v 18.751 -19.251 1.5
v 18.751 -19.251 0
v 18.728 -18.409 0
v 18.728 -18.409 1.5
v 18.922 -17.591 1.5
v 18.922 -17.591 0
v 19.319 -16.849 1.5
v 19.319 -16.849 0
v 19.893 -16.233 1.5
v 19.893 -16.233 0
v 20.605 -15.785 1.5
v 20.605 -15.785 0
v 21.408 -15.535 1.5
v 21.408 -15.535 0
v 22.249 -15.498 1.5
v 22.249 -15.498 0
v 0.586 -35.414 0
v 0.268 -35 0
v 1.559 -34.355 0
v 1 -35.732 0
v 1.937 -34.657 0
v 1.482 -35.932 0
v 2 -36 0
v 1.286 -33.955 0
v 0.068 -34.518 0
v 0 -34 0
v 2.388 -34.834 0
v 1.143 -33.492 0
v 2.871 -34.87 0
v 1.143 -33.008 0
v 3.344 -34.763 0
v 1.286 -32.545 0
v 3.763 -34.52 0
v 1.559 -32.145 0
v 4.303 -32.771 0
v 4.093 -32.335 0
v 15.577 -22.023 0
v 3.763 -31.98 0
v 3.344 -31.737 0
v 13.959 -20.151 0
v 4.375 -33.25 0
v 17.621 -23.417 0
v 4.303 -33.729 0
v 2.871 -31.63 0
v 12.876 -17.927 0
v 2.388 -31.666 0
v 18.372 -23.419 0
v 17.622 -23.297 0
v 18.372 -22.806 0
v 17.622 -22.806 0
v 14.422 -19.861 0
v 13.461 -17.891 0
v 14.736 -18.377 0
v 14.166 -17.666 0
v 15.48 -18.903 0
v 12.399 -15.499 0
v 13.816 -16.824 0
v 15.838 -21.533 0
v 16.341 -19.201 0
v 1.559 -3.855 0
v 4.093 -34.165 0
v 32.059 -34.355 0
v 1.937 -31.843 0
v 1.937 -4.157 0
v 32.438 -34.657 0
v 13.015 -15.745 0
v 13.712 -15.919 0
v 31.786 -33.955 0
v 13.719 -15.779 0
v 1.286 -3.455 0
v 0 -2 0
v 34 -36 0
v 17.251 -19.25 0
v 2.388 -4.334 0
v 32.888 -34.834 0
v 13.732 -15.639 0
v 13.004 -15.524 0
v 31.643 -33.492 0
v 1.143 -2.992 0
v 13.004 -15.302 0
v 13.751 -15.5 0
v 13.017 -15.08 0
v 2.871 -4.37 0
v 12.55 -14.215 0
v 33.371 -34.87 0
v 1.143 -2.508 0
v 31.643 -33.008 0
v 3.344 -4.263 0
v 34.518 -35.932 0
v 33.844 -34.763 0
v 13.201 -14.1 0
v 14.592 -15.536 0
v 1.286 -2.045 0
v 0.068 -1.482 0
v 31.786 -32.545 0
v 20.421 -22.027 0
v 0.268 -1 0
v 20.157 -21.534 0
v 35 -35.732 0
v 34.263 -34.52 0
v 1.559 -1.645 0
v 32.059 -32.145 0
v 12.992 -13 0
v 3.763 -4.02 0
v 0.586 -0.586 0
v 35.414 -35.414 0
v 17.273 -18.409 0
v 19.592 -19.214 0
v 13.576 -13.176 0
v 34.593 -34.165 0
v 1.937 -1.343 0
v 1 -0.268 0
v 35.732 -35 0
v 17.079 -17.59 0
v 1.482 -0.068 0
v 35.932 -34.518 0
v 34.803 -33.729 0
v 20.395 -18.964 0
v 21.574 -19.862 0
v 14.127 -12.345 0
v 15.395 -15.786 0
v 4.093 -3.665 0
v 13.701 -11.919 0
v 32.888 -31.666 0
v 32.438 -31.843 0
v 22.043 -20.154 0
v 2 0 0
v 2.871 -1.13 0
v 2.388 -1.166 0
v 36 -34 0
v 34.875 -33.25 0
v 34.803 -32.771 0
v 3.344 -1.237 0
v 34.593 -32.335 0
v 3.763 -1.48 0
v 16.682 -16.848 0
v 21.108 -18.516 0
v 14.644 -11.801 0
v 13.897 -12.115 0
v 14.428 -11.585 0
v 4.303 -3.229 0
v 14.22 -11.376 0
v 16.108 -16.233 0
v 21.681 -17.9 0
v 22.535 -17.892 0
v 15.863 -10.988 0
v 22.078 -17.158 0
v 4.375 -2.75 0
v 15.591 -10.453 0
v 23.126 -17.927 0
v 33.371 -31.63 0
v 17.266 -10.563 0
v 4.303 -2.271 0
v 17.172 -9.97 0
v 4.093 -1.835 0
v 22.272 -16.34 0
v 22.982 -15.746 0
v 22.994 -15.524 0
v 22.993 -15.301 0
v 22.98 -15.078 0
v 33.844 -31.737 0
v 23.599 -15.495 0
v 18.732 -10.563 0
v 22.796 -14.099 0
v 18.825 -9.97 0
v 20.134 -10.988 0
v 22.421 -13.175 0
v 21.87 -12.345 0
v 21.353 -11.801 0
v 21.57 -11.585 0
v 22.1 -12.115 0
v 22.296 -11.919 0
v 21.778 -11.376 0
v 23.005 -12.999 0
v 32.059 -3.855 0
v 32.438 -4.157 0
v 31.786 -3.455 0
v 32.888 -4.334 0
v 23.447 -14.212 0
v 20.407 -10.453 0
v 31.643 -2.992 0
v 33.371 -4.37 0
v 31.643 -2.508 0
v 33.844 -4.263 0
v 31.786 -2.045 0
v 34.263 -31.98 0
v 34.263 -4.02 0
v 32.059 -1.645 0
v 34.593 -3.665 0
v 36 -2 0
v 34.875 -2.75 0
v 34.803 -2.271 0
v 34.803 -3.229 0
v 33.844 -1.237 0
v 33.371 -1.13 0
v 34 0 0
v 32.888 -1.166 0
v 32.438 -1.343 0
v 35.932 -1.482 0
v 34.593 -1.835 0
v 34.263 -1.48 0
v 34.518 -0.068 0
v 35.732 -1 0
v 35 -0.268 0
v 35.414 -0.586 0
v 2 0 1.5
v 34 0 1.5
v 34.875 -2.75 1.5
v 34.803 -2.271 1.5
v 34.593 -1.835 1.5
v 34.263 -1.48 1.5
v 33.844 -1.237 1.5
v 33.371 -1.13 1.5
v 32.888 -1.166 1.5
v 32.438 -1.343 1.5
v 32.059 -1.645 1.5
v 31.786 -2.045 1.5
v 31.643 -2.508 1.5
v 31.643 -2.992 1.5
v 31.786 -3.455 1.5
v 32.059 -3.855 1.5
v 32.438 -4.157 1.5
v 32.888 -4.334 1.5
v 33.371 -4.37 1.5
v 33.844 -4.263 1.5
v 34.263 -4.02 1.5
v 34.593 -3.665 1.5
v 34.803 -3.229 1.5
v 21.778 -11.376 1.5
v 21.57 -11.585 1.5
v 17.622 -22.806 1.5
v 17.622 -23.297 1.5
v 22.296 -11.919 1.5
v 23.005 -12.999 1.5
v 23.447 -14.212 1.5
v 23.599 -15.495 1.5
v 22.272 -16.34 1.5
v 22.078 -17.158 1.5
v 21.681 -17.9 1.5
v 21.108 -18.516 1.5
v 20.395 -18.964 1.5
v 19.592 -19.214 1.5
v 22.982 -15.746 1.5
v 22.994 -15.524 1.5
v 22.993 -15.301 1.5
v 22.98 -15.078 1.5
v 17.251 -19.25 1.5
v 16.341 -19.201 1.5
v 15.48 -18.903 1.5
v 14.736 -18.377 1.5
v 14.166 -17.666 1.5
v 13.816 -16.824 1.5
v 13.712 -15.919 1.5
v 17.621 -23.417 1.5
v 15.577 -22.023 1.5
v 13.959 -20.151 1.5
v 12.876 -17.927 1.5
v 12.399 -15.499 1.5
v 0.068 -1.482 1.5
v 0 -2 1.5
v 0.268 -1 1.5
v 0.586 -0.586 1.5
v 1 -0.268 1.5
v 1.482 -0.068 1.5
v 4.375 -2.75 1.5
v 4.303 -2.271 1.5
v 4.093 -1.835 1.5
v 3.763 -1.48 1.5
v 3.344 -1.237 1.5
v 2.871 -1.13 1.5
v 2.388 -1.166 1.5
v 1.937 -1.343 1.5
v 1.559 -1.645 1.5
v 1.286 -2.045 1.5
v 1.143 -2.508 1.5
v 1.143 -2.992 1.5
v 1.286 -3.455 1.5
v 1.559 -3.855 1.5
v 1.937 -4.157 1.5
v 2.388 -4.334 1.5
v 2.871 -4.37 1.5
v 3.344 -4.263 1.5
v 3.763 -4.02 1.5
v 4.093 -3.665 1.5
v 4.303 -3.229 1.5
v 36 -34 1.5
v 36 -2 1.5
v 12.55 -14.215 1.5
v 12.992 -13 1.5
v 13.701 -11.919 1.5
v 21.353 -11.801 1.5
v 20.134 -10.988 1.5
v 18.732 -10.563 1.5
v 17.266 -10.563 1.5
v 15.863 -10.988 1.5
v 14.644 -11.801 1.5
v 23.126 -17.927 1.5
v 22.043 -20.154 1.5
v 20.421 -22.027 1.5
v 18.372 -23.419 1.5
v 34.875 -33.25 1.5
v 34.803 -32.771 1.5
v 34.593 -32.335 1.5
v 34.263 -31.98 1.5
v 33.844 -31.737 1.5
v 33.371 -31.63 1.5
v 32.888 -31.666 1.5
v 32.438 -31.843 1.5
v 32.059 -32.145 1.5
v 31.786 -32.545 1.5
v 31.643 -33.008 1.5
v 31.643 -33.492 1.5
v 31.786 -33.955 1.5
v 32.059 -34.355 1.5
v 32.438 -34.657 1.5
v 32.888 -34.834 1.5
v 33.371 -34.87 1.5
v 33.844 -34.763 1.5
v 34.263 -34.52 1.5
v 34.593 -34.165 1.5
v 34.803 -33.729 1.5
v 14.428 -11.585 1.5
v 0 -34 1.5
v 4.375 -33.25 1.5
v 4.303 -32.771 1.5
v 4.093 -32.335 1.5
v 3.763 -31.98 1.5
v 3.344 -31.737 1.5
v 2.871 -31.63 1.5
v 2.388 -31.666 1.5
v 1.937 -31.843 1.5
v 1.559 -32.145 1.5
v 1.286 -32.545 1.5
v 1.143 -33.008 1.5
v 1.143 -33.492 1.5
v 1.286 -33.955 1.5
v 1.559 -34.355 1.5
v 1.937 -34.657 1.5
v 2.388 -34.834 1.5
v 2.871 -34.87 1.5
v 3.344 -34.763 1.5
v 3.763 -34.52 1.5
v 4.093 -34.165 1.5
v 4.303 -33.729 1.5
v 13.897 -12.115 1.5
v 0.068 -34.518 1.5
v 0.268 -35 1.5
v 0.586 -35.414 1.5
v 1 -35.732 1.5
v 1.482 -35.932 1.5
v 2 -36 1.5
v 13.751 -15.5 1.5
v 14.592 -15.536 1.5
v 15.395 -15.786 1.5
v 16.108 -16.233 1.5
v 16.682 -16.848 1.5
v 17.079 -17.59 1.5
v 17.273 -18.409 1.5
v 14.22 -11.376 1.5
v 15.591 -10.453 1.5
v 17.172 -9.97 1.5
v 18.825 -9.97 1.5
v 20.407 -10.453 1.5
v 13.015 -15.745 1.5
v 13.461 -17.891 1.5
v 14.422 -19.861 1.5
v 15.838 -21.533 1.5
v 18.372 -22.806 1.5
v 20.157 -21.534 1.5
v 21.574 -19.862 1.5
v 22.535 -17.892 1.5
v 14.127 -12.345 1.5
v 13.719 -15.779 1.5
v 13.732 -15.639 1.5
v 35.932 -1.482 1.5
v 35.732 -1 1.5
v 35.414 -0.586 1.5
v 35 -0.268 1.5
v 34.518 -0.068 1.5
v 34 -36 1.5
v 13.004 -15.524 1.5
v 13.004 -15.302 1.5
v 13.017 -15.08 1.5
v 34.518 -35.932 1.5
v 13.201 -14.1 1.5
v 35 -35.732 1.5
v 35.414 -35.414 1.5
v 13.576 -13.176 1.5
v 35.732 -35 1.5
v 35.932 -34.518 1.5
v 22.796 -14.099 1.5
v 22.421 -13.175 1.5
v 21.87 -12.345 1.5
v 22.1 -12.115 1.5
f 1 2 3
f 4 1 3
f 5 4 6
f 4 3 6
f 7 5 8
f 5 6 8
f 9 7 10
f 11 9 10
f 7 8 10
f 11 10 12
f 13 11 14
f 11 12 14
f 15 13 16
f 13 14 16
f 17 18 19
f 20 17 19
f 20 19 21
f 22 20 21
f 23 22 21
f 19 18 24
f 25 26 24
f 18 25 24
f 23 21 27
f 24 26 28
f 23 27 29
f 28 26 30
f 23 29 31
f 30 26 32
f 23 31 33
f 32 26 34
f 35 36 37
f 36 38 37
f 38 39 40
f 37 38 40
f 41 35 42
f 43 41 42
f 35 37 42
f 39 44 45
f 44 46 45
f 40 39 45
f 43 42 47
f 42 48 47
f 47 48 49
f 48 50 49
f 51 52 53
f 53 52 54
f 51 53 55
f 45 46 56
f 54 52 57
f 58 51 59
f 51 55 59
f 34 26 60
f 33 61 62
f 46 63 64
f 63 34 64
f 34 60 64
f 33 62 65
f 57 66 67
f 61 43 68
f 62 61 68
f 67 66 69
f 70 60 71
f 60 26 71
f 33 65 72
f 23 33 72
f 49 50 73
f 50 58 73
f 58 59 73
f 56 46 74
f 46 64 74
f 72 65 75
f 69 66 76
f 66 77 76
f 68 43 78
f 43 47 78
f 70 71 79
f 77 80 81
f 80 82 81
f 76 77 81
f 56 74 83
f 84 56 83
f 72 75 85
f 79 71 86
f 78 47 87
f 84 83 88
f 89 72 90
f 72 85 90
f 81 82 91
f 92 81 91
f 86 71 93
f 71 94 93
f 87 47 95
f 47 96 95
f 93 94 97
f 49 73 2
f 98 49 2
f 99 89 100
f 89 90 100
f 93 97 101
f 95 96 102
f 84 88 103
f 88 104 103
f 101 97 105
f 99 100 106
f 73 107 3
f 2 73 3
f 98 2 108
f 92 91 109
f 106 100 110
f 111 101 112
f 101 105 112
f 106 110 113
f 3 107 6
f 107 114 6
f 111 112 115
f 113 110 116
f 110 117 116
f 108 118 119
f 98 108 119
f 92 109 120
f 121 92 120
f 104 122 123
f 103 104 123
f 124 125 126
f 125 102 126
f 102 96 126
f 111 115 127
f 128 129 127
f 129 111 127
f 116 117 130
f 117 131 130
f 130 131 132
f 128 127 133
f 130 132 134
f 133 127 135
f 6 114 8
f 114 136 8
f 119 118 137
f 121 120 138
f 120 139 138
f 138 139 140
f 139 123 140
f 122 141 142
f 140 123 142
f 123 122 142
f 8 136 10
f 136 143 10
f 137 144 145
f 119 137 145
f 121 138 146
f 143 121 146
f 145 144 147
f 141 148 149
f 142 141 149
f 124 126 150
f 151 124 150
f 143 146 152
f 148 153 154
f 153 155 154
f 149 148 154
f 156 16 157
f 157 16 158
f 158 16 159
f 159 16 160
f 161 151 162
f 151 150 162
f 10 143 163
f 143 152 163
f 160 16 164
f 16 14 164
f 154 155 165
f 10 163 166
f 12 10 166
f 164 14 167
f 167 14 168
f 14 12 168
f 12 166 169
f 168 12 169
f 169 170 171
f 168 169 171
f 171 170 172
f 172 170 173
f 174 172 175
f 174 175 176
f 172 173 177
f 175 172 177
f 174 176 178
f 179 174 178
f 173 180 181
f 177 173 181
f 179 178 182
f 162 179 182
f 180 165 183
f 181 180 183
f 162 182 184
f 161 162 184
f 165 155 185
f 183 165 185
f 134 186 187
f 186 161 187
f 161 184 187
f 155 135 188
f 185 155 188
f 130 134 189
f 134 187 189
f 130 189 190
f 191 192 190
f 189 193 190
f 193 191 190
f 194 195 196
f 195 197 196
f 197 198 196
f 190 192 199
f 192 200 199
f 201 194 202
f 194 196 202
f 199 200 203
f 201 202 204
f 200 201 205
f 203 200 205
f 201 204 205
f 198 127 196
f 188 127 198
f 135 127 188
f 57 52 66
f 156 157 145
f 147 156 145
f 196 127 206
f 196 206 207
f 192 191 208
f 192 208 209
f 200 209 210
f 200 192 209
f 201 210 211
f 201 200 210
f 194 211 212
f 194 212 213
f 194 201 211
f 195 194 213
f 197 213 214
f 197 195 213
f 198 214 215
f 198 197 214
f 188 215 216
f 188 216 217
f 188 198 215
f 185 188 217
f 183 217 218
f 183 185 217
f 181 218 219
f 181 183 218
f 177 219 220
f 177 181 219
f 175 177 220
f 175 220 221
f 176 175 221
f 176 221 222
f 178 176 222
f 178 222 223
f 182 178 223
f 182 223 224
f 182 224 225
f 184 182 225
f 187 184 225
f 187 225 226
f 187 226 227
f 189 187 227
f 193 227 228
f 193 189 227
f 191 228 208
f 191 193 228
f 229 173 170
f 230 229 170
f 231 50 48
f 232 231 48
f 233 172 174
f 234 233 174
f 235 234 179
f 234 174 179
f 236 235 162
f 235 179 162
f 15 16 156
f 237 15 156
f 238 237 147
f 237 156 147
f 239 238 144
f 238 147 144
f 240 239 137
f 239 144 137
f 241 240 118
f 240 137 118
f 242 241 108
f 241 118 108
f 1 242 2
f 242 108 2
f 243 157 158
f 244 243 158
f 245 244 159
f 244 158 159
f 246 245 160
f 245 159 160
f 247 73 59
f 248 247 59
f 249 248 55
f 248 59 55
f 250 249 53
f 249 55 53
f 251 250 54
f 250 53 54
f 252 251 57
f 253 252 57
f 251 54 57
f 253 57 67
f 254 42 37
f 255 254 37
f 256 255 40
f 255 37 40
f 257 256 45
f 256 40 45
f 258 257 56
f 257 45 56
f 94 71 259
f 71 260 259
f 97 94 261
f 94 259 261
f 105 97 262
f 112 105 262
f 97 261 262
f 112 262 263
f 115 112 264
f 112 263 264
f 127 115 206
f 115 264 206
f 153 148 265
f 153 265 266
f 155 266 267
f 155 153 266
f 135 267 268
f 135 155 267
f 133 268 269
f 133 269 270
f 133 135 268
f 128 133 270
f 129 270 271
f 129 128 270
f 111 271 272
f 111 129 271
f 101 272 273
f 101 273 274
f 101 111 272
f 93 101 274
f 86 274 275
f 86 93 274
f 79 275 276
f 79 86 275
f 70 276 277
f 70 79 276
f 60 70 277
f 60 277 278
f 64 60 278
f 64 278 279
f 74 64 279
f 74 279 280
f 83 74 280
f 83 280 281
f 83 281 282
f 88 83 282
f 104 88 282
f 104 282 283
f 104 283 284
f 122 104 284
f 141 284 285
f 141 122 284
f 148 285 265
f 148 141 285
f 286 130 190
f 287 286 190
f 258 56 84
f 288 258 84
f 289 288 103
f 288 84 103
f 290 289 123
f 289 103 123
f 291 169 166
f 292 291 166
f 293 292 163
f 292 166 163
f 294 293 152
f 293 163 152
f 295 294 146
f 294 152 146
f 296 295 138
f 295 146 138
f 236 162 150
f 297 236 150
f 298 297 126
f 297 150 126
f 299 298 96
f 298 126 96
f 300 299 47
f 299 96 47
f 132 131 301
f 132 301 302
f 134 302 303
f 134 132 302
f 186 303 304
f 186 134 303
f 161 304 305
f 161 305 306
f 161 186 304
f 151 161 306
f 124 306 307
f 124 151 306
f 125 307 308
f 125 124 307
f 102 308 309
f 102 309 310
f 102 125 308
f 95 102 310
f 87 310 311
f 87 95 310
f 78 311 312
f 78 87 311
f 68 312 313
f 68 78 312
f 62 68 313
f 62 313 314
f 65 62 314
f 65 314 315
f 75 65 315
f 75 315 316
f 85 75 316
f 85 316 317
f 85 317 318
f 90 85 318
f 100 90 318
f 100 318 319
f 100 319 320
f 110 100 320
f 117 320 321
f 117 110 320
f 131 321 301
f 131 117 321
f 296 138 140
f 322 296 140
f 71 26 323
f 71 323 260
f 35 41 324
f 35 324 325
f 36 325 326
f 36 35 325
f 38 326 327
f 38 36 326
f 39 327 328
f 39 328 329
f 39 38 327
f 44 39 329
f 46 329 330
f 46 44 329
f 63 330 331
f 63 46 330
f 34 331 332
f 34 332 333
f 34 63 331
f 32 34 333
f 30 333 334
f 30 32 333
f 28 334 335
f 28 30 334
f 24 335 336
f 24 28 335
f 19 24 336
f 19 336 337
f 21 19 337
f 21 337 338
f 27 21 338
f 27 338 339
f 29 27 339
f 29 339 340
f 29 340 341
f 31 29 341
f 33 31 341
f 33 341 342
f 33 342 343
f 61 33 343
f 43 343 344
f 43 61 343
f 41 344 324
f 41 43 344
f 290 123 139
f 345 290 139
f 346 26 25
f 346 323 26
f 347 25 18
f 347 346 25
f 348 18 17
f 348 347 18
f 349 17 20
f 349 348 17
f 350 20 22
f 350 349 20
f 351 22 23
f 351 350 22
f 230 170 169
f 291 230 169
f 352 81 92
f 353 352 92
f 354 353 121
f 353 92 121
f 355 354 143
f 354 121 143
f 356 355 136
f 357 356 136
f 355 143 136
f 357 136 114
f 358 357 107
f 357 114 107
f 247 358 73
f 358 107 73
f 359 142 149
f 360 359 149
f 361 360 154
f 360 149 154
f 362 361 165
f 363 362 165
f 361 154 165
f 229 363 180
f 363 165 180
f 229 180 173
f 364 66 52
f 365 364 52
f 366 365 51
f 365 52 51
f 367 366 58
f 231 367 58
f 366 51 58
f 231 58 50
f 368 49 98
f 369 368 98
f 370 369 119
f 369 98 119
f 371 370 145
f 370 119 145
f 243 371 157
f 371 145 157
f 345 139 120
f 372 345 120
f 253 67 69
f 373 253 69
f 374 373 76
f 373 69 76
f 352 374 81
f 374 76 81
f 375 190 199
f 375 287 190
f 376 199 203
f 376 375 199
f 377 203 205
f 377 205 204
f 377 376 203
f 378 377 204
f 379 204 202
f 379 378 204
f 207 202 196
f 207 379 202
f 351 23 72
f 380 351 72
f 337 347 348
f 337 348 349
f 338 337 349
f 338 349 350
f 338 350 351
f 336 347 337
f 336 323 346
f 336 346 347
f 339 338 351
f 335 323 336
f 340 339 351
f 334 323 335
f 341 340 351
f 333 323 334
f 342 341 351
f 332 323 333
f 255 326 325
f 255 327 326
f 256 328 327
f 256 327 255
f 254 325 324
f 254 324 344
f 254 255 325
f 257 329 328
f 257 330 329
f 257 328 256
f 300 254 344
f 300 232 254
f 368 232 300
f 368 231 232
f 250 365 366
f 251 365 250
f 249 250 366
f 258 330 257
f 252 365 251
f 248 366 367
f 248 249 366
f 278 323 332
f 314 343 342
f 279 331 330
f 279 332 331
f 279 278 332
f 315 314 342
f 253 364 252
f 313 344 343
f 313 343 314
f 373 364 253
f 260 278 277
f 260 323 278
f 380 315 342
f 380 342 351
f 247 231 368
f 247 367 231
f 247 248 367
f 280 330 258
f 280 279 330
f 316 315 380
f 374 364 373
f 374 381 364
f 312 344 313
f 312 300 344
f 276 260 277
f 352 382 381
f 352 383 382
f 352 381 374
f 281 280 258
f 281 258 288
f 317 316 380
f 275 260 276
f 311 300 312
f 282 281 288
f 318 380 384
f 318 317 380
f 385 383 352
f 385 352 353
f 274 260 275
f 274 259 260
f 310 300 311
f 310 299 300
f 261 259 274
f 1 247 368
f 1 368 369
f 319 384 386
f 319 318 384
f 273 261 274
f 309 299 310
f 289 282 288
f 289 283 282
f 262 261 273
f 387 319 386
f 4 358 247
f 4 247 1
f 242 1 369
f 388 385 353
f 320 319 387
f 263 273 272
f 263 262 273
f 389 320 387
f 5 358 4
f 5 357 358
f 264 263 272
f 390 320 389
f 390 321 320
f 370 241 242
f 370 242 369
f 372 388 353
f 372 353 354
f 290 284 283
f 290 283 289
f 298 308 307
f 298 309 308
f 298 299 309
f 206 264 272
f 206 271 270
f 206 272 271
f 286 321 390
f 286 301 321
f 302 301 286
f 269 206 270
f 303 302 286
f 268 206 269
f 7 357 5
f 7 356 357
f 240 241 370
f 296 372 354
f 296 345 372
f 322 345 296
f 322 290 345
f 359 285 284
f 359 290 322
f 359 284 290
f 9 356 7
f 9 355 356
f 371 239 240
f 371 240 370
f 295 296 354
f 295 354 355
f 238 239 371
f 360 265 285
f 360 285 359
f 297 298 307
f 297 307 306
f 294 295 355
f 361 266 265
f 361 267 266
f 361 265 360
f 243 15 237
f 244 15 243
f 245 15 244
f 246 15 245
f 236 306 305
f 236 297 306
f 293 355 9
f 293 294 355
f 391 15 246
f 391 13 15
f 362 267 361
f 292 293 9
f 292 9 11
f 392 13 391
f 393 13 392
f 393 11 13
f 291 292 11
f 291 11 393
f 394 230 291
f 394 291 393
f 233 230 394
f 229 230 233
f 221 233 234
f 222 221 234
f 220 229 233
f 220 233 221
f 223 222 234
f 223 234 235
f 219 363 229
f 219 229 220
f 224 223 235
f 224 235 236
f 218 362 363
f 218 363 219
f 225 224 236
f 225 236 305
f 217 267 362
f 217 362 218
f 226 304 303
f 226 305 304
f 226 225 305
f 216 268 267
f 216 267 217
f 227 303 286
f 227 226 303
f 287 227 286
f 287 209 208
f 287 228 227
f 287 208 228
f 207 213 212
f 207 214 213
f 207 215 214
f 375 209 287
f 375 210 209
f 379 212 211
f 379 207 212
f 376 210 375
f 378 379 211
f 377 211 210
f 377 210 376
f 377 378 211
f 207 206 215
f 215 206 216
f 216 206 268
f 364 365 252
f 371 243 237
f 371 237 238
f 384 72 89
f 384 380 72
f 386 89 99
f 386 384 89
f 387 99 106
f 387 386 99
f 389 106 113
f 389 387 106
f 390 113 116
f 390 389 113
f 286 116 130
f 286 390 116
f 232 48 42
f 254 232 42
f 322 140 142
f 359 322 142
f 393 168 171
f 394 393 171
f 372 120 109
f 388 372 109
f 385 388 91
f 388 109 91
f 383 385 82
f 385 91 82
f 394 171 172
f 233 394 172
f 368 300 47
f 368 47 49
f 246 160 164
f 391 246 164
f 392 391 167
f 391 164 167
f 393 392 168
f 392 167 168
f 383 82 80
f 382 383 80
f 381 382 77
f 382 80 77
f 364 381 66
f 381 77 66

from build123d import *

# Parameters (mm, degrees)
F0_W        = 36
F0_H        = 36
F0_R        = 1.625
F1_DEPTH    = 1.5
F2_R        = 2
F3_T1_DEPTH = 3.5843159378
F3_T3_DEPTH = 3.5765382717


# Not quite as in the source:
# - a fillet or chamfer that OpenCascade refuses, or shapes differently, is made with other operations: its cross-section is extruded or revolved along the edge and cut away or added


with BuildPart() as f1:
    # F0 (on Top) → F1 (new body)
    with BuildSketch(Plane.XY):
        with Locations((18, -18)):
            Rectangle(F0_W, F0_H)
        with Locations((2.75, -33.25)):
            Circle(F0_R, mode=Mode.SUBTRACT)
        with Locations((33.25, -33.25)):
            Circle(F0_R, mode=Mode.SUBTRACT)
        with BuildLine():
            ThreePointArc((21.7779175478, -11.3763919814), (22.046238649, -11.6387988402), (22.2963811606, -11.918588577))
            ThreePointArc((22.2963811606, -11.918588577), (23.2607600241, -13.5926773143), (23.5988556823, -15.4948579101))
            ThreePointArc((23.5988556823, -15.4948579101), (22.0425607669, -20.1541714045), (18.3719356765, -23.4187950503))
            ThreePointArc((18.3719356765, -23.4187950503), (18.1854087753, -23.510113363), (17.9969356765, -23.5973441498))
            ThreePointArc((17.9969356765, -23.5973441498), (17.8078713111, -23.5092095417), (17.6207740645, -23.4169725439))
            ThreePointArc((17.6207740645, -23.4169725439), (13.9590716003, -20.150973111), (12.3987158352, -15.4990802577))
            ThreePointArc((12.3987158352, -15.4990802577), (12.7360960776, -13.5946679159), (13.7011902766, -11.9185996051))
            ThreePointArc((13.7011902766, -11.9185996051), (13.9513320879, -11.638809208), (14.2196525358, -11.3764016446))
            ThreePointArc((14.2196525358, -11.3764016446), (17.9987831657, -9.9089991809), (21.7779175478, -11.3763919814))
        make_face(mode=Mode.SUBTRACT)
        with Locations((2.75, -2.75)):
            Circle(F0_R, mode=Mode.SUBTRACT)
        with Locations((33.25, -2.75)):
            Circle(F0_R, mode=Mode.SUBTRACT)
        with BuildLine():
            ThreePointArc((18.3719356765, -22.8064015707), (21.6418869825, -19.7559203536), (22.9988556823, -15.4948579101))
            ThreePointArc((22.9988556823, -15.4948579101), (22.7058670076, -13.8225937813), (21.8702080342, -12.3447630196))
            ThreePointArc((21.8702080342, -12.3447630196), (21.6219028277, -12.0632376766), (21.3531767506, -11.8011340904))
            ThreePointArc((21.3531767506, -11.8011340904), (17.9987795183, -10.508999181), (14.644381672, -11.8011324963))
            ThreePointArc((14.644381672, -11.8011324963), (14.3756554704, -12.0632359548), (14.12735013, -12.3447611798))
            ThreePointArc((14.12735013, -12.3447611798), (13.2916900536, -13.8225926629), (12.9987009782, -15.4948579101))
            ThreePointArc((12.9987009782, -15.4948579101), (14.3541308063, -19.7551514484), (17.6219356765, -22.8061746181))
            ThreePointArc((17.6219356765, -22.8061746181), (17.8082968783, -22.9039932616), (17.9969356765, -22.9973441498))
            ThreePointArc((17.9969356765, -22.9973441498), (18.1855728443, -22.9041061909), (18.3719356765, -22.8064015707))
        make_face()
        with BuildLine():
            ThreePointArc((13.7508900496, -15.5000002377), (16.4147091349, -16.5221024247), (17.2508900496, -19.2500002377))
            ThreePointArc((17.2508900496, -19.2500002377), (14.7355024037, -18.3769724477), (13.7124911572, -15.9187616104))
            ThreePointArc((13.7124911572, -15.9187616104), (13.7249235892, -15.7087604135), (13.7508900496, -15.5000002377))
        make_face(mode=Mode.SUBTRACT)
        with BuildLine():
            ThreePointArc((18.7512718965, -19.25059231), (19.5857343833, -16.5222080691), (22.2488645533, -15.4984180975))
            ThreePointArc((22.2488645533, -15.4984180975), (21.4144020665, -18.2268023385), (18.7512718965, -19.25059231))
        make_face(mode=Mode.SUBTRACT)
        with BuildLine():
            Line((18.3719356765, -23.2973441498), (18.3719356765, -22.8064015707))
            ThreePointArc((18.3719356765, -22.8064015707), (18.1855728443, -22.9041061909), (17.9969356765, -22.9973441498))
            ThreePointArc((17.9969356765, -22.9973441498), (17.8082968783, -22.9039932616), (17.6219356765, -22.8061746181))
            Line((17.6219356765, -22.8061746181), (17.6219356765, -23.2973441498))
            Line((17.6219356765, -23.2973441498), (17.6207740645, -23.4169725439))
            ThreePointArc((17.6207740645, -23.4169725439), (17.8078713111, -23.5092095417), (17.9969356765, -23.5973441498))
            ThreePointArc((17.9969356765, -23.5973441498), (18.1854087753, -23.510113363), (18.3719356765, -23.4187950503))
            Line((18.3719356765, -23.4187950503), (18.3719356765, -23.2973441498))
        make_face()
        with BuildLine():
            ThreePointArc((21.3531767506, -11.8011340904), (21.6219028277, -12.0632376766), (21.8702080342, -12.3447630196))
            Line((21.8702080342, -12.3447630196), (22.1000614519, -12.114908892))
            Line((22.1000614519, -12.114908892), (22.2963811606, -11.918588577))
            ThreePointArc((22.2963811606, -11.918588577), (22.046238649, -11.6387988402), (21.7779175478, -11.3763919814))
            Line((21.7779175478, -11.3763919814), (21.5697305471, -11.5845796251))
            Line((21.5697305471, -11.5845796251), (21.3531767506, -11.8011340904))
        make_face()
        with BuildLine():
            ThreePointArc((14.12735013, -12.3447611798), (14.3756554704, -12.0632359548), (14.644381672, -11.8011324963))
            Line((14.644381672, -11.8011324963), (14.4278279784, -11.584577928))
            Line((14.4278279784, -11.584577928), (14.2196525358, -11.3764016446))
            ThreePointArc((14.2196525358, -11.3764016446), (13.9513320879, -11.638809208), (13.7011902766, -11.9185996051))
            Line((13.7011902766, -11.9185996051), (13.8974968216, -12.114906943))
            Line((13.8974968216, -12.114906943), (14.12735013, -12.3447611798))
        make_face()
    extrude(amount=F1_DEPTH)

    # F2
    f2_edges = [f1.edges().sort_by_distance(p)[0] for p in [
        (36, -36, 0.75),
        (0, -36, 0.75),
        (36, 0, 0.75),
        (0, 0, 0.75),
    ]]
    fillet(f2_edges, radius=F2_R)

    # F3: fillet of radius 4 on 2 edges, made by hand

    # F3_s2 → F3_t1 (cut)
    with BuildSketch(Plane.XY.offset(-1.0421579689)):
        with BuildLine():
            ThreePointArc((22.982065791, -15.7463315161), (22.9951448823, -15.4123328014), (22.980292521, -15.0784082419))
            ThreePointArc((22.980292521, -15.0784082419), (22.9939159673, -15.2864395382), (22.9988556823, -15.4948579101))
            ThreePointArc((22.9988556823, -15.4948579101), (22.9913576348, -15.6206545954), (22.982065791, -15.7463315161))
        make_face()
    extrude(amount=F3_T1_DEPTH, mode=Mode.SUBTRACT)

    # F3_s4 → F3_t3 (cut)
    with BuildSketch(Plane.XY.offset(-1.0382691359)):
        with BuildLine():
            ThreePointArc((13.0171302774, -15.0799593578), (13.0023850075, -15.4126416016), (13.0153633645, -15.745397459))
            ThreePointArc((13.0153633645, -15.745397459), (13.0061419392, -15.6201868903), (12.9987009782, -15.4948579101))
            ThreePointArc((12.9987009782, -15.4948579101), (13.0036060893, -15.2872172094), (13.0171302774, -15.0799593578))
        make_face()
    extrude(amount=F3_T3_DEPTH, mode=Mode.SUBTRACT)


solid = f1.part
